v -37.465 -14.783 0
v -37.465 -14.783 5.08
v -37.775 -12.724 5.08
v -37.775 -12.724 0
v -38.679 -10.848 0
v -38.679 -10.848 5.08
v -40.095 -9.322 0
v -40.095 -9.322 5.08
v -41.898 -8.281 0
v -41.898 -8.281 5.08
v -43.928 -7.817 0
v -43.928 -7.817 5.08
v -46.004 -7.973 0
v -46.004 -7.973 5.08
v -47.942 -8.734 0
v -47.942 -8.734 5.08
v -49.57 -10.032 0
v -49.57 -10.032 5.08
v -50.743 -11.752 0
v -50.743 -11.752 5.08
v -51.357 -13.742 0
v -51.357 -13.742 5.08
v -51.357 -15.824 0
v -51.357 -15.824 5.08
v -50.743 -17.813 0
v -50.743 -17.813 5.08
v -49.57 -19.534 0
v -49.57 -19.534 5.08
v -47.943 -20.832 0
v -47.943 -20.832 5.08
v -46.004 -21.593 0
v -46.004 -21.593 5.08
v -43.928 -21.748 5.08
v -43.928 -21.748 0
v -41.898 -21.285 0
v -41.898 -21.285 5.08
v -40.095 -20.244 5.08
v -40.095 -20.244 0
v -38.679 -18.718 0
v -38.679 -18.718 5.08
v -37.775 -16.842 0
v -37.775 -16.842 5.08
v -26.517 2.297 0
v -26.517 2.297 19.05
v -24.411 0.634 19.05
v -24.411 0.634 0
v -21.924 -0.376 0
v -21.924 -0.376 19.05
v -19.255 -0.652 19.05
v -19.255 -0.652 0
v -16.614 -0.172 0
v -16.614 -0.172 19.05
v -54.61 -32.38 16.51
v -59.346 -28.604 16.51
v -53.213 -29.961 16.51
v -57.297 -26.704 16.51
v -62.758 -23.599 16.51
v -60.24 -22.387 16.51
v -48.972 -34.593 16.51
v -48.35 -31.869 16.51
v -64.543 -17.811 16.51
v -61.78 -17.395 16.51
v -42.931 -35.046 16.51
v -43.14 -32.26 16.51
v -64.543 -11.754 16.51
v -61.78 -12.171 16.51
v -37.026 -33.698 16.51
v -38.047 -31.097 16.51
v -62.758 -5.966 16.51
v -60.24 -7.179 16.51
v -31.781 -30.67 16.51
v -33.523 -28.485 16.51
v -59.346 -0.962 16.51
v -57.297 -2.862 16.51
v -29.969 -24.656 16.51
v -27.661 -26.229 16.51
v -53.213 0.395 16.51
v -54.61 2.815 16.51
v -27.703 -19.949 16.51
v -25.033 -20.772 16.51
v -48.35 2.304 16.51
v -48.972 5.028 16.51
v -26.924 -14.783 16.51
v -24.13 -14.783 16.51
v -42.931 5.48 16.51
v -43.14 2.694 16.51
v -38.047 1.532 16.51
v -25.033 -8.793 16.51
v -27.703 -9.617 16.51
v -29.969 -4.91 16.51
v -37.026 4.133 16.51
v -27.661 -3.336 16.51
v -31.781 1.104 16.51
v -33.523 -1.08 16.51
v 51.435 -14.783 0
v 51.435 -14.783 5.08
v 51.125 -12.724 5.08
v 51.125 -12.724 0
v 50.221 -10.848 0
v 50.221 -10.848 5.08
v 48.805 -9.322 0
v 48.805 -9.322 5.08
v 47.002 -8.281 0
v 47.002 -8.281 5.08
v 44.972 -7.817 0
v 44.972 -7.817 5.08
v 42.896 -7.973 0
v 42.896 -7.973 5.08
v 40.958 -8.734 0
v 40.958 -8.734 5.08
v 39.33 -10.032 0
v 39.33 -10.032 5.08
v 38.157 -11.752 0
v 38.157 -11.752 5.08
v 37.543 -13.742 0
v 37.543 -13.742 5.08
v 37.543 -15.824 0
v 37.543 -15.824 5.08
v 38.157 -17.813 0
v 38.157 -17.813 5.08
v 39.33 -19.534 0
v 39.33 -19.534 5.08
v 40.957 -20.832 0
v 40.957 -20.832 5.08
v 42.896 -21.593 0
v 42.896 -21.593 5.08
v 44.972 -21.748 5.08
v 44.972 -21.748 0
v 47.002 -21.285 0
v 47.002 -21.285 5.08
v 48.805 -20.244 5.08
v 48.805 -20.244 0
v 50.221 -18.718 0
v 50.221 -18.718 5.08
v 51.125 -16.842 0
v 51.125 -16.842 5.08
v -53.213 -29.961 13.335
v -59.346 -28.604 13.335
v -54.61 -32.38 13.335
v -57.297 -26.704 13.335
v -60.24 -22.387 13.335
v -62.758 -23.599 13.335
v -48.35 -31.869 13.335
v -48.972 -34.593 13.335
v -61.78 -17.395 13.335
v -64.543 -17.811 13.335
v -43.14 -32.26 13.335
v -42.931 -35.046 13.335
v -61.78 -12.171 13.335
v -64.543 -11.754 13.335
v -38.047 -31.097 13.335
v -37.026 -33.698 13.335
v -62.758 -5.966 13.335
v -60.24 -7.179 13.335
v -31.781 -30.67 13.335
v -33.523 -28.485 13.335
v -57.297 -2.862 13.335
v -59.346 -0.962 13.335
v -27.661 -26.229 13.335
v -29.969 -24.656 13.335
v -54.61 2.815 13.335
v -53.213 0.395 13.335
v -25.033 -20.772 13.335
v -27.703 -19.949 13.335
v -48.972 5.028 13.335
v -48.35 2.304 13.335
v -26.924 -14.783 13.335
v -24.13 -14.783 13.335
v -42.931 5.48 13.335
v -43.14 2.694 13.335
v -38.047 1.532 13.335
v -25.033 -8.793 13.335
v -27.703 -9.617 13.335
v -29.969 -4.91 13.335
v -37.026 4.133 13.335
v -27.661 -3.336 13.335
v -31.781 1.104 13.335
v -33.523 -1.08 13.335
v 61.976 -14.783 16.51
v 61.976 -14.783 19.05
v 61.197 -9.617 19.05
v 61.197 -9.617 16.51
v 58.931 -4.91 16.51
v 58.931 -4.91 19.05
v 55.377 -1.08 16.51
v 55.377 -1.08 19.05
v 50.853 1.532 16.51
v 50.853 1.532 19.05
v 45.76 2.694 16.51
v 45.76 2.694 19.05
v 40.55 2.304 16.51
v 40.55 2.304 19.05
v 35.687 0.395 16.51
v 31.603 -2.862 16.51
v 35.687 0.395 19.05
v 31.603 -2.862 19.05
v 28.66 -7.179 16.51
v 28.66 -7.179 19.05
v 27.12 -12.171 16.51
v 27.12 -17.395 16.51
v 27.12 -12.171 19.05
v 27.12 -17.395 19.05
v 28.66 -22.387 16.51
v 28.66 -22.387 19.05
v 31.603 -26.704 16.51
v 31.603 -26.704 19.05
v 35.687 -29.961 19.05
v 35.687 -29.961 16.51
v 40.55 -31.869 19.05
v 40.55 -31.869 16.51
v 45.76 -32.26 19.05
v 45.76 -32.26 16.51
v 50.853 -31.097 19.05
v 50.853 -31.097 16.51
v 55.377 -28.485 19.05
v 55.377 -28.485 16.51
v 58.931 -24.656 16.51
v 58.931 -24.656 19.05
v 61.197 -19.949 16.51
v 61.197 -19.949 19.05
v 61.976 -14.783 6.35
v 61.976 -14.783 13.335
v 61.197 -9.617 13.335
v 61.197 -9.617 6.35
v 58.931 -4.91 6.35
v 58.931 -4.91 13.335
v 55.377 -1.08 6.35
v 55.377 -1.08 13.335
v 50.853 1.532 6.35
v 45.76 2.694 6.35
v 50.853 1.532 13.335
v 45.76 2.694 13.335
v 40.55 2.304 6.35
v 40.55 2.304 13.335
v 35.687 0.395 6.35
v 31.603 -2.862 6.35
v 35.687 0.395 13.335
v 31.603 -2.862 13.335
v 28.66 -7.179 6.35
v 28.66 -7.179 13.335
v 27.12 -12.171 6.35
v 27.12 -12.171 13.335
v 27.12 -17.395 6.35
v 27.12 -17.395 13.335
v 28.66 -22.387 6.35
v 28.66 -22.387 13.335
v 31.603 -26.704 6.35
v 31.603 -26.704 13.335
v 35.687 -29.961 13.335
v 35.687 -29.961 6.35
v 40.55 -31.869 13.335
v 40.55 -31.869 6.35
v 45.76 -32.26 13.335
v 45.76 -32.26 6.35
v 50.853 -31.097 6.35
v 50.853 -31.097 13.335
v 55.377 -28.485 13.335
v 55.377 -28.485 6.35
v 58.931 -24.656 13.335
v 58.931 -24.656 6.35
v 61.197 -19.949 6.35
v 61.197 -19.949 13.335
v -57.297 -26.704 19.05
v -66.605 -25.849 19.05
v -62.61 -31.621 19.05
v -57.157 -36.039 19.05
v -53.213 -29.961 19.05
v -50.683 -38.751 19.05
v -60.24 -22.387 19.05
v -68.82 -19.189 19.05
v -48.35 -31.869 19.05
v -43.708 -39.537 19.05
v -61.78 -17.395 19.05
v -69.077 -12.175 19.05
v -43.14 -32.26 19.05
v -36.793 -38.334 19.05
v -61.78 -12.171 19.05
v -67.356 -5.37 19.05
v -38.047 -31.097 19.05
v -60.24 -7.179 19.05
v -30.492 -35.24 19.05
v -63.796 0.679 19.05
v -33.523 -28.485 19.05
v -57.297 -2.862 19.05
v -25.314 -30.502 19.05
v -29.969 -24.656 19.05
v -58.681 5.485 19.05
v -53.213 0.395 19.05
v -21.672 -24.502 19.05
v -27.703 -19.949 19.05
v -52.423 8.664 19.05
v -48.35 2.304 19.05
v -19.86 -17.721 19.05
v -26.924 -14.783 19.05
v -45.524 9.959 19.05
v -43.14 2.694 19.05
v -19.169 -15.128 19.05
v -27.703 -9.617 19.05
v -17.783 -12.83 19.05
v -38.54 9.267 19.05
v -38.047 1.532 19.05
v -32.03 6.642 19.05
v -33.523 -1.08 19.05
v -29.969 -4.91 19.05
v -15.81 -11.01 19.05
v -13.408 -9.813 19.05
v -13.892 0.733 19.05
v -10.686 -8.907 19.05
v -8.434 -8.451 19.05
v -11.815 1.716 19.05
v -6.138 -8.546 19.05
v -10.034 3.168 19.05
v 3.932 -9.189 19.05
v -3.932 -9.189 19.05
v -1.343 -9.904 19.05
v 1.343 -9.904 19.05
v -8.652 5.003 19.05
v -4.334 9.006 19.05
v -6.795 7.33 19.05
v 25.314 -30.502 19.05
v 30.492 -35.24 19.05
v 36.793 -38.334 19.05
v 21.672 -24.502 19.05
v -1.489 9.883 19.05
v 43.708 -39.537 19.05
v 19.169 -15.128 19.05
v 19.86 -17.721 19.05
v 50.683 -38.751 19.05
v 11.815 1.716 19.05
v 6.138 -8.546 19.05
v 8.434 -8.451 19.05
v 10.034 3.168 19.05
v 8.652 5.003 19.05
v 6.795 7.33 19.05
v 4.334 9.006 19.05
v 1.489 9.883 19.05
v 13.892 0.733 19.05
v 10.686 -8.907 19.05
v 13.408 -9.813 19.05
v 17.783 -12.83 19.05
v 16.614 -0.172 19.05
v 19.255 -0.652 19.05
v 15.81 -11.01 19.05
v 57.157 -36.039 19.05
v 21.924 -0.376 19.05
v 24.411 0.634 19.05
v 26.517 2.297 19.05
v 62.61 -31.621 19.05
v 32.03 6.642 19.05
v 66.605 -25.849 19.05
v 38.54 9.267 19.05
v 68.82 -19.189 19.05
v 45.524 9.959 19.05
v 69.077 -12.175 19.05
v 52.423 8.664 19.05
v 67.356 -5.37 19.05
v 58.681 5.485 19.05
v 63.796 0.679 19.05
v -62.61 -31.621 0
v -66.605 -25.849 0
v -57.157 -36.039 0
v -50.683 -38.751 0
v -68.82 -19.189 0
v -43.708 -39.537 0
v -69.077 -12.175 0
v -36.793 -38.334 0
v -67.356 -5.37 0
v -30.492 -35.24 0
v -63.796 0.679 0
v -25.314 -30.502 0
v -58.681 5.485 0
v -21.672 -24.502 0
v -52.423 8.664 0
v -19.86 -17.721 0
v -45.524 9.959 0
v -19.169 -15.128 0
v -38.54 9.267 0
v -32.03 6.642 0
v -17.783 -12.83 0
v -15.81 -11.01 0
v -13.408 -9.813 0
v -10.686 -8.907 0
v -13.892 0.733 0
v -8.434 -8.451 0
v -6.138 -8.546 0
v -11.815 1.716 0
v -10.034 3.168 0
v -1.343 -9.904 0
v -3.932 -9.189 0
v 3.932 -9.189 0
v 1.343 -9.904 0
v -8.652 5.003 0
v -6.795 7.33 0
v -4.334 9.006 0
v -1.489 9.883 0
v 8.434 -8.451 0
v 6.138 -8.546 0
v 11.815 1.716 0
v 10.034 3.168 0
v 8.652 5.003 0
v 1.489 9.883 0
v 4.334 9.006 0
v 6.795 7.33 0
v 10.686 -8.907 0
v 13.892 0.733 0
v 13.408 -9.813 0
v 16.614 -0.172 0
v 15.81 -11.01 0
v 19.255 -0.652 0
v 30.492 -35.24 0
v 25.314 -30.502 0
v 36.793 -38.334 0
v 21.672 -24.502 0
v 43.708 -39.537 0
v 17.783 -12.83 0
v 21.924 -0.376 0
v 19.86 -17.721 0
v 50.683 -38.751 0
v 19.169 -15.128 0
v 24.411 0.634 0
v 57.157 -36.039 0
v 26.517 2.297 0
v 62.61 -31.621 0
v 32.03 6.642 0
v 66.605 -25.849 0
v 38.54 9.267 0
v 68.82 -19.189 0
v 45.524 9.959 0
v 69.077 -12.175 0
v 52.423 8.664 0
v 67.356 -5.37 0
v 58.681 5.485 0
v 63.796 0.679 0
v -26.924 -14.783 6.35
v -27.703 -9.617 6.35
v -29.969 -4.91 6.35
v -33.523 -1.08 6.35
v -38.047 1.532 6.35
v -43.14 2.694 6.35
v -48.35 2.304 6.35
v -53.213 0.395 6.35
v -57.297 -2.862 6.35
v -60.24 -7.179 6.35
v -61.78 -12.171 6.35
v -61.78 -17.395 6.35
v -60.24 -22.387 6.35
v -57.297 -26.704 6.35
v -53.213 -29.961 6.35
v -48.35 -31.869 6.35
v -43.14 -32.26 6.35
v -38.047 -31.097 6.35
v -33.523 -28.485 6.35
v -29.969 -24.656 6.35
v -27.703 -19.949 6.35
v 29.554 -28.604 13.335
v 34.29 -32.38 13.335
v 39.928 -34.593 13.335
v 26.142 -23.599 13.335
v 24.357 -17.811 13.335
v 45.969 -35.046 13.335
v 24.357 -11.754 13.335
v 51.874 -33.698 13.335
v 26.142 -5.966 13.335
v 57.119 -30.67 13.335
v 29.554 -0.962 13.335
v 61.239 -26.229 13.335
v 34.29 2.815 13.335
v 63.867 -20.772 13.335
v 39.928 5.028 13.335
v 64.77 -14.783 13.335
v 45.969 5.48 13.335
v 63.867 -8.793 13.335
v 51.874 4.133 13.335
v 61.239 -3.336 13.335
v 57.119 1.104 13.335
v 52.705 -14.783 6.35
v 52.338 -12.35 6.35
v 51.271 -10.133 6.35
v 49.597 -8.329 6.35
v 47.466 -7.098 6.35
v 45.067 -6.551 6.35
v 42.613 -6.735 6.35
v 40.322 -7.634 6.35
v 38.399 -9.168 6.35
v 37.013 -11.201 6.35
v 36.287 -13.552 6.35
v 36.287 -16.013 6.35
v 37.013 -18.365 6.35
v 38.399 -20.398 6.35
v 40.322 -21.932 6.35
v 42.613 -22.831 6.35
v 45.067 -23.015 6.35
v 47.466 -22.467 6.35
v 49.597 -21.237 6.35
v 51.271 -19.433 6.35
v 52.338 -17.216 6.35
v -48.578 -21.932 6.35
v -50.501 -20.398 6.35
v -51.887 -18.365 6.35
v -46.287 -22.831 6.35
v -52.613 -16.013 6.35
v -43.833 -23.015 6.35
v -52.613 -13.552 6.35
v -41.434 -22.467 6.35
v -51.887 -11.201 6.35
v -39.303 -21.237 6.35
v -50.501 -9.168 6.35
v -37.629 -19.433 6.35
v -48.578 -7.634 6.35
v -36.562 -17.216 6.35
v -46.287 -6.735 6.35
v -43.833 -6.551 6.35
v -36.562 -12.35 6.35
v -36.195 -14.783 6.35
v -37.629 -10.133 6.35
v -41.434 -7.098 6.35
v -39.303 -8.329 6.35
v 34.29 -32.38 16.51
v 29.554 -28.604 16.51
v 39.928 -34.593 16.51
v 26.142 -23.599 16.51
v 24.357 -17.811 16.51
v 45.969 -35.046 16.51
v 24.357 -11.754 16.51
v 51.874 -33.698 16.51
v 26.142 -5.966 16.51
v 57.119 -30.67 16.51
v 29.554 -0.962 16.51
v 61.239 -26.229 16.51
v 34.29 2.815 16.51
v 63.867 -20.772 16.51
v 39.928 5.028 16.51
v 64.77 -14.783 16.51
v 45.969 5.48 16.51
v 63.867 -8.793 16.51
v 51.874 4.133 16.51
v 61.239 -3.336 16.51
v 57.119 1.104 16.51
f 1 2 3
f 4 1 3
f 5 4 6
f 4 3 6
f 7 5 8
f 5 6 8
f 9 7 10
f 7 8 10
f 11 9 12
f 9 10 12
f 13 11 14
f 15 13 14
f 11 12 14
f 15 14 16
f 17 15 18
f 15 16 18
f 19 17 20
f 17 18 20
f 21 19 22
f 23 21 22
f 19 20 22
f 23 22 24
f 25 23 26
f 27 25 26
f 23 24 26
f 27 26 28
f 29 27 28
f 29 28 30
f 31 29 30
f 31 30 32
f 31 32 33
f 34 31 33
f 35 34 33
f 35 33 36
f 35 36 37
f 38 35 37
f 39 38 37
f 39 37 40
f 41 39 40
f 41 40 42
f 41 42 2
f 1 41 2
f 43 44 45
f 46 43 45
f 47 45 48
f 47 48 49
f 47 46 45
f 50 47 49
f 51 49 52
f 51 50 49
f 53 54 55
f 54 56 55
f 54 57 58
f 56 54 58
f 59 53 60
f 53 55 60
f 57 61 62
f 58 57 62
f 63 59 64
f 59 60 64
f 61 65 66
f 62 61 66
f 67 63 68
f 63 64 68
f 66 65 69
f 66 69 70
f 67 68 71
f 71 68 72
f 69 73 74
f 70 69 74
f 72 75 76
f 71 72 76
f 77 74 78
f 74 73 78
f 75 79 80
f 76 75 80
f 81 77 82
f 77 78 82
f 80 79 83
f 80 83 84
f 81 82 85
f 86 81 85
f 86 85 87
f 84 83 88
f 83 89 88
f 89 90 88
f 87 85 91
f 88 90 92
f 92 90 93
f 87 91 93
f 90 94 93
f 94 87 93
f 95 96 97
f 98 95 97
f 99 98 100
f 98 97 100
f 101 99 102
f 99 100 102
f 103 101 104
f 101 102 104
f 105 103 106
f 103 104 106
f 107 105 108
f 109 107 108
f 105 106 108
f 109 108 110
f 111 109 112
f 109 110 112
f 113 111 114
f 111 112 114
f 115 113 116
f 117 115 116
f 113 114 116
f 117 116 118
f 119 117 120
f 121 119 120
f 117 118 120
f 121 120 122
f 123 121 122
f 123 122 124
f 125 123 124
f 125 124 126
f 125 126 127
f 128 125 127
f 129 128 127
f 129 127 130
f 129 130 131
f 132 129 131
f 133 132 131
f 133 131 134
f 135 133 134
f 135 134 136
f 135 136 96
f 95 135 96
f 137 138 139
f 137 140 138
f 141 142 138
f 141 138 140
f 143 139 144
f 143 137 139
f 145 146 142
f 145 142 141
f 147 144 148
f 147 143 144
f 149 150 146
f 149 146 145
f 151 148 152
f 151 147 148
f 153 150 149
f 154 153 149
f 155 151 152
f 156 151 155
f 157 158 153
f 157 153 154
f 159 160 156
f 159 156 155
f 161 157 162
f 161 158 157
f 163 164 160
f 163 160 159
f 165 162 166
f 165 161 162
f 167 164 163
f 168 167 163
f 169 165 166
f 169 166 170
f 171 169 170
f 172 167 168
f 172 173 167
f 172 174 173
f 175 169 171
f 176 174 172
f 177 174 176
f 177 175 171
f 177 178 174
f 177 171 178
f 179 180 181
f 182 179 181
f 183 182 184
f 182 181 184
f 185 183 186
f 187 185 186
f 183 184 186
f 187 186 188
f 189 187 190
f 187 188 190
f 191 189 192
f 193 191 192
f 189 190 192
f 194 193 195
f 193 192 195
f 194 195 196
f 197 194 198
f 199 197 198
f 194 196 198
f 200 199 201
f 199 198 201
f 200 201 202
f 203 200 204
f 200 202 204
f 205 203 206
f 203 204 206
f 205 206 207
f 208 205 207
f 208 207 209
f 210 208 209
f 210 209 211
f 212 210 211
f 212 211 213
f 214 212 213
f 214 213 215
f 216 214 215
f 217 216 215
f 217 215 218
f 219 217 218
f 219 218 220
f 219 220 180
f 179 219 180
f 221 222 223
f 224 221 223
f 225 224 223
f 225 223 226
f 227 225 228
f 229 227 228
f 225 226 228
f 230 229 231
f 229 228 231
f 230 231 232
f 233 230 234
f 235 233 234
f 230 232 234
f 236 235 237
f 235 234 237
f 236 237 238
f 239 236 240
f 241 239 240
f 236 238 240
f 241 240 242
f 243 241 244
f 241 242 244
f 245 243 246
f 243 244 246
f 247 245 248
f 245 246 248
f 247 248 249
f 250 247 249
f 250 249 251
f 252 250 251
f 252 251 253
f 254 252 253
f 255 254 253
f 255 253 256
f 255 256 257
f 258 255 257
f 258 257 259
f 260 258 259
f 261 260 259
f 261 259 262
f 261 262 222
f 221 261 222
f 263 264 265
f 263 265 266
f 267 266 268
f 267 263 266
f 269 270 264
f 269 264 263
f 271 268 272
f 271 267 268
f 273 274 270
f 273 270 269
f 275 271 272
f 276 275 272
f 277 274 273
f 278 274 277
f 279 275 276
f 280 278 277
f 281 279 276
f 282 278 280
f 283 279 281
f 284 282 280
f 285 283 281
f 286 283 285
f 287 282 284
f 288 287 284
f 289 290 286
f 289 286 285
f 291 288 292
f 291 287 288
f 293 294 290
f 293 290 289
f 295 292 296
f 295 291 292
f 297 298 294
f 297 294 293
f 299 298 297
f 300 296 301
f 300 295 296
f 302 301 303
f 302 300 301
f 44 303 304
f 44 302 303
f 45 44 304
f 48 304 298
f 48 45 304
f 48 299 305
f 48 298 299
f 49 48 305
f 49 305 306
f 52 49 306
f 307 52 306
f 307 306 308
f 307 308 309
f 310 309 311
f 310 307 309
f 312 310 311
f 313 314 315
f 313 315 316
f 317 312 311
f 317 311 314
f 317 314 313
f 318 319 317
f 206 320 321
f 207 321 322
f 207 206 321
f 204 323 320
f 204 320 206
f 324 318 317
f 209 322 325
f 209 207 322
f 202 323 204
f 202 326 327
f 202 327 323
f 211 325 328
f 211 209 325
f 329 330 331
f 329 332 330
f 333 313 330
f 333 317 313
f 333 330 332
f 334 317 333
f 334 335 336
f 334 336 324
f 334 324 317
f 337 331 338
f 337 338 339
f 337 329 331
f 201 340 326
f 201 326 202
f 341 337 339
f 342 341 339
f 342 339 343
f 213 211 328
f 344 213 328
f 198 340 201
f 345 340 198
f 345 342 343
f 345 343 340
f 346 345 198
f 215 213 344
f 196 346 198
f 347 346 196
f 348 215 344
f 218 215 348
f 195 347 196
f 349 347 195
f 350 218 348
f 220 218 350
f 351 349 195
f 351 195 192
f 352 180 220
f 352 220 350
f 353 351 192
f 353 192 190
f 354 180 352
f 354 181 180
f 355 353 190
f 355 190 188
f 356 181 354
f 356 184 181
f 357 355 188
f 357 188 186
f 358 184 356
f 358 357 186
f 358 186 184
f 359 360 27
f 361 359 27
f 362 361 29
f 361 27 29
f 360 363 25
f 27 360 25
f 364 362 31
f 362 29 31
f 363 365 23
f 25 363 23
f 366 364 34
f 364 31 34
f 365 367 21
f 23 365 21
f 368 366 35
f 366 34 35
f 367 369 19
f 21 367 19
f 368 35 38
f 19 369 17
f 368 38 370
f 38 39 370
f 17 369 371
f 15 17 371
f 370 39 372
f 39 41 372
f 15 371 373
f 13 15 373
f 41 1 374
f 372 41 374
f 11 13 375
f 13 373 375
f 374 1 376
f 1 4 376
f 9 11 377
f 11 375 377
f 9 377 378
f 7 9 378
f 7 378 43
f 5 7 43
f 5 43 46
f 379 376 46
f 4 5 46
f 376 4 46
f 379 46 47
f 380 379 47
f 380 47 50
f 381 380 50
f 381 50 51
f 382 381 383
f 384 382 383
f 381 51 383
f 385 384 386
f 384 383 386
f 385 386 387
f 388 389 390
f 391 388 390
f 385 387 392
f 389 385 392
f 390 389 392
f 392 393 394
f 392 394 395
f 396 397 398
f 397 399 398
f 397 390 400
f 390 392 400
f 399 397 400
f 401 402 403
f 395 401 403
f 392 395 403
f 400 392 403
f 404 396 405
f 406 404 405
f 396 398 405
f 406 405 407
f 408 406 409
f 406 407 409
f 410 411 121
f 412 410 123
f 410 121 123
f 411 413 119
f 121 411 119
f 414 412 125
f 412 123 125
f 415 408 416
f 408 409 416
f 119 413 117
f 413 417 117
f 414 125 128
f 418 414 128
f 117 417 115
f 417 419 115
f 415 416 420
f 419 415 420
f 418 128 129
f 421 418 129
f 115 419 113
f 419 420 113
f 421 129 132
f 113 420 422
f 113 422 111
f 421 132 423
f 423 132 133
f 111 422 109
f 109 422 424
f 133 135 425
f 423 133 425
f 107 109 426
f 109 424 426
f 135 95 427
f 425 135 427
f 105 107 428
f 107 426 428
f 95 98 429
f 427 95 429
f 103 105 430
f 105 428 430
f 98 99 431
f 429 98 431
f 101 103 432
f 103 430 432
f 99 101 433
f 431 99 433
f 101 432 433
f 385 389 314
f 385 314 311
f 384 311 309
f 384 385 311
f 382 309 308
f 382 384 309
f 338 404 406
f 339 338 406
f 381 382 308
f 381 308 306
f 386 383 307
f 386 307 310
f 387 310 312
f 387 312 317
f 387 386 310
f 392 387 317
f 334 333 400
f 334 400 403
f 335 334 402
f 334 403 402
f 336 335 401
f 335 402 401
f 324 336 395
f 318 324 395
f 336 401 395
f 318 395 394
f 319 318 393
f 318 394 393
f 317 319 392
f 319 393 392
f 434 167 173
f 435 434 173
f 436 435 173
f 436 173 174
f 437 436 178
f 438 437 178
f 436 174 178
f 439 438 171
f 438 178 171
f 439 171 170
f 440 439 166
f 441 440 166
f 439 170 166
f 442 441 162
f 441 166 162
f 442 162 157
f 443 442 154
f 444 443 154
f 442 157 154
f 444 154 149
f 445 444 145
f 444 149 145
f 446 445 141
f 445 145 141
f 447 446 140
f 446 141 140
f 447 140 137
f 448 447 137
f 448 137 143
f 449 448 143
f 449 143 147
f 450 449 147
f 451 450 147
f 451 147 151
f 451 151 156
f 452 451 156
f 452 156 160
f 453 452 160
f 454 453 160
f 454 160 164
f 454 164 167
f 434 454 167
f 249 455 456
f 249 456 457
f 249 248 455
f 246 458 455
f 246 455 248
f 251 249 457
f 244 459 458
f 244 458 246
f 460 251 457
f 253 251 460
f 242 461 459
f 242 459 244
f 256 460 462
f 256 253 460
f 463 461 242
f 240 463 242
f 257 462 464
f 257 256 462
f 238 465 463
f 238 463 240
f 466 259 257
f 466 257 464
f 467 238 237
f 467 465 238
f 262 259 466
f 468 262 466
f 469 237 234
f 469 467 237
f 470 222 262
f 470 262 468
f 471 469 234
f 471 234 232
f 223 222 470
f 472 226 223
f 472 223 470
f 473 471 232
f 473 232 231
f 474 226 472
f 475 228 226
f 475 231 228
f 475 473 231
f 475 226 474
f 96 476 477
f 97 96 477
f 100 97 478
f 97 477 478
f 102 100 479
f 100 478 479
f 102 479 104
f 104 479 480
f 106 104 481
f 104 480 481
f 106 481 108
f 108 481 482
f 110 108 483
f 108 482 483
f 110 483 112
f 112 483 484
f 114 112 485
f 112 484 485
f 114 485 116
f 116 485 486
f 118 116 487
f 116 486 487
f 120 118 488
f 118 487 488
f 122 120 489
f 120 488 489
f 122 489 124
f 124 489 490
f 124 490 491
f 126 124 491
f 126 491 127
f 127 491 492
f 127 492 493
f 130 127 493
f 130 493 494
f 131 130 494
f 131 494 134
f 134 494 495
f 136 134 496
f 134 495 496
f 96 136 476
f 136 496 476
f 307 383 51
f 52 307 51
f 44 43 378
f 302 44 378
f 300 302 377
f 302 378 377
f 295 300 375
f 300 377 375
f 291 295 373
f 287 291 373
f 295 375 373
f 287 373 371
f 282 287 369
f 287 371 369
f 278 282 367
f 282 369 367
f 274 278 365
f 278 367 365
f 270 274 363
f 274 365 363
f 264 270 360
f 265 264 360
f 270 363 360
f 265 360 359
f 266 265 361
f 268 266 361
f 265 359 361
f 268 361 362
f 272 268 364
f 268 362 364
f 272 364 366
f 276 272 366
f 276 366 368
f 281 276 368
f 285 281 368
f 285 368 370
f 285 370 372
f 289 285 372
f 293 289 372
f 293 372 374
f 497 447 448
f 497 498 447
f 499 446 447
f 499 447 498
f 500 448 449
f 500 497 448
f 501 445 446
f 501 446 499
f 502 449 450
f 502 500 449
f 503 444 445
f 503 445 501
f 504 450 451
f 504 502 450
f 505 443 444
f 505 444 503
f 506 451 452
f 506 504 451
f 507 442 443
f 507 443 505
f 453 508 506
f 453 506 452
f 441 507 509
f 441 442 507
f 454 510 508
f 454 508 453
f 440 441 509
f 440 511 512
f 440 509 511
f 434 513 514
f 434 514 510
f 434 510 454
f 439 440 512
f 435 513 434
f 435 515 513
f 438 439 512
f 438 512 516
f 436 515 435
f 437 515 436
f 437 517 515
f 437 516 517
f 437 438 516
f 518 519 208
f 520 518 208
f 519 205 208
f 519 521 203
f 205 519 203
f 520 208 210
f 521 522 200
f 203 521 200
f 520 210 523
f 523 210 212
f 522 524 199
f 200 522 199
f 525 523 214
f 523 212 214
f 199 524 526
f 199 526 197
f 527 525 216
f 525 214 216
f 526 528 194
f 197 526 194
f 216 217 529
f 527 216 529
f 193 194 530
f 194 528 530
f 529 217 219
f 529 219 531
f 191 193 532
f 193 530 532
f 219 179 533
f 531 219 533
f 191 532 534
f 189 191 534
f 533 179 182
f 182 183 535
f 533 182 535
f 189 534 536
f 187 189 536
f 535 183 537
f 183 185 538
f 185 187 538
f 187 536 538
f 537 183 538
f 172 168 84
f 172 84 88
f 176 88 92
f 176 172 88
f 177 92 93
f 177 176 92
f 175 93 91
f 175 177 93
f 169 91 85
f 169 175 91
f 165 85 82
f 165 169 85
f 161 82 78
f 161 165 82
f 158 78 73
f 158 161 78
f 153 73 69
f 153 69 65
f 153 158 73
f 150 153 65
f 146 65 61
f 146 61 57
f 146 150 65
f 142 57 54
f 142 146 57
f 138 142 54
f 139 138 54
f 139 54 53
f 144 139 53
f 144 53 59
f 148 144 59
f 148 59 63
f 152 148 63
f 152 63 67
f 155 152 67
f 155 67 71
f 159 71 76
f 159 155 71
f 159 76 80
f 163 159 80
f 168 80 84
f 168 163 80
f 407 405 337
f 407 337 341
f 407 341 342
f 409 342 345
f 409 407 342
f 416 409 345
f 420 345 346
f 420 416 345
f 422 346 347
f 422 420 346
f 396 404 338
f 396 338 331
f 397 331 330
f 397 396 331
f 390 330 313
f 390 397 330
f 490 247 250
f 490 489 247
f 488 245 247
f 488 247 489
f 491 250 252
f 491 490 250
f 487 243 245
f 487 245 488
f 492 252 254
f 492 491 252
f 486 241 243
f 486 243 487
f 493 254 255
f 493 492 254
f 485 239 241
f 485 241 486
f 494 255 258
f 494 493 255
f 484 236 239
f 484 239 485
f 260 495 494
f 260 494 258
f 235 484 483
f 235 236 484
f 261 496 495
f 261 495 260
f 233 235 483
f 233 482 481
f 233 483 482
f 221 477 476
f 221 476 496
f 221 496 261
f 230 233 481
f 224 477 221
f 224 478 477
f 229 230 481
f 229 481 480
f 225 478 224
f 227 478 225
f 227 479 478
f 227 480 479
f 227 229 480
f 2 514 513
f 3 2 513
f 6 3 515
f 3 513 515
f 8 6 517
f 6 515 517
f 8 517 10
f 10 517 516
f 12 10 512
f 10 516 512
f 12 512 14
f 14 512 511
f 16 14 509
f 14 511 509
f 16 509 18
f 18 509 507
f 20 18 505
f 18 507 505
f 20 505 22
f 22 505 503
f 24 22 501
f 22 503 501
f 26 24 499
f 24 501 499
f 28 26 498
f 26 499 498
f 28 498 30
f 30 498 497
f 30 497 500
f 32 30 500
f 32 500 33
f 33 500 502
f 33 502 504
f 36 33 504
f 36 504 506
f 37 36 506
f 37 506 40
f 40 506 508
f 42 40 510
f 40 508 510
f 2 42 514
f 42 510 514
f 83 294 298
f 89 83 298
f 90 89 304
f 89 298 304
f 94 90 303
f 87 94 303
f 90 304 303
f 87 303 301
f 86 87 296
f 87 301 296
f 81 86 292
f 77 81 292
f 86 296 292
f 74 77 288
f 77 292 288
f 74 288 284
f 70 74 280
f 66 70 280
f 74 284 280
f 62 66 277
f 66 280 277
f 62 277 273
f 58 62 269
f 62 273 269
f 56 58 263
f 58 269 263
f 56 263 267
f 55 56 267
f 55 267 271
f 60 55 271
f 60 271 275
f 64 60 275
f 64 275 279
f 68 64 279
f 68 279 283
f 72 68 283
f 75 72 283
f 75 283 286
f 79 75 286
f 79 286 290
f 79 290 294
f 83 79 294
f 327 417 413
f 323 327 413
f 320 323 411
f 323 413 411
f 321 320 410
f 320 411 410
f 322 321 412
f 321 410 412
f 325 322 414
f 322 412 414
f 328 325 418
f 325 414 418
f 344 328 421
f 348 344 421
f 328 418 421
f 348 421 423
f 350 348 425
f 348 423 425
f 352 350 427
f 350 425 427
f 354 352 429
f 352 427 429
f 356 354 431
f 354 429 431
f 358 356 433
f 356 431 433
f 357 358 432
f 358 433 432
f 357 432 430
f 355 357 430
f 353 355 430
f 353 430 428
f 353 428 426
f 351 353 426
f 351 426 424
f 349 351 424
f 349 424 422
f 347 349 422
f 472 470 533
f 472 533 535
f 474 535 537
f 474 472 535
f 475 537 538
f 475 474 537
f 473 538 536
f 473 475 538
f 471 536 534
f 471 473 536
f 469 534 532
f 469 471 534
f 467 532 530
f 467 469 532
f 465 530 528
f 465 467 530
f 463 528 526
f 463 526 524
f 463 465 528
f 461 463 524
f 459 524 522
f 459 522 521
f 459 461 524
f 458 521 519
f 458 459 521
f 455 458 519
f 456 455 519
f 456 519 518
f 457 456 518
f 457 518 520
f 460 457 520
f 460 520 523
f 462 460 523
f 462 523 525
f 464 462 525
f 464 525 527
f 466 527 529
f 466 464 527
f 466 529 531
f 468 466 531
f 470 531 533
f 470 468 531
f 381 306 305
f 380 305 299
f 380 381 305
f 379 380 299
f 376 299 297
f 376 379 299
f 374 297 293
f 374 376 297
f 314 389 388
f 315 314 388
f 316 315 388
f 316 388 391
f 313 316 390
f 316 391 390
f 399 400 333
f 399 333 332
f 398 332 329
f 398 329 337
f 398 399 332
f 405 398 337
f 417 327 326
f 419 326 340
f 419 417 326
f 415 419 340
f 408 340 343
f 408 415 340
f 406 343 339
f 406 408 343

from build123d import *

# Parameters (mm, degrees)
PAD_DEPTH       = 19.05
SKETCH001_R     = 17.526
POCKET_DEPTH    = 12.7
SKETCH002_R     = 6.985
POCKET001_DEPTH = 6.351
CHAMFER_SIZE    = 1.27
SKETCH003_R     = 20.32
POCKET002_DEPTH = 3.175


with BuildPart() as part:
    # Sketch → Pad (new body)
    with BuildSketch(Plane.XY):
        with BuildLine():
            ThreePointArc((-26.517355, 2.297173), (-67.949508, -22.598065), (-19.859908, -17.720926))
            ThreePointArc((-13.408051, -9.812702), (-17.782581, -12.829737), (-19.859908, -17.720926))
            Line((-10.685782, -8.907353), (-13.408051, -9.812702))
            ThreePointArc((-3.932394, -9.188814), (-7.283282, -8.428887), (-10.685782, -8.907353))
            ThreePointArc((-3.932394, -9.188814), (0, -9.9949), (3.932394, -9.188814))
            ThreePointArc((10.685782, -8.907353), (7.283282, -8.428887), (3.932394, -9.188814))
            Line((10.685782, -8.907353), (13.408051, -9.812702))
            ThreePointArc((19.859908, -17.720926), (17.782581, -12.829737), (13.408051, -9.812702))
            ThreePointArc((19.859908, -17.720926), (67.949508, -22.598065), (26.517355, 2.297173))
            ThreePointArc((16.614313, -0.171878), (21.924443, -0.375685), (26.517355, 2.297173))
            Line((13.892044, 0.73347), (16.614313, -0.171878))
            ThreePointArc((8.652348, 5.003488), (10.880692, 2.388068), (13.892044, 0.73347))
            ThreePointArc((8.652348, 5.003488), (0, 9.9949), (-8.652348, 5.003488))
            ThreePointArc((-13.892044, 0.73347), (-10.880692, 2.388068), (-8.652348, 5.003488))
            Line((-13.892044, 0.73347), (-16.614313, -0.171878))
            ThreePointArc((-26.517355, 2.297173), (-21.924443, -0.375685), (-16.614313, -0.171878))
        make_face()
    extrude(amount=PAD_DEPTH)

    # Sketch001 (on Face18 of Pad) → Pocket (cut)
    with BuildSketch(Plane.XY.offset(19.05)):
        with Locations((-44.45, -14.7828)):
            Circle(SKETCH001_R)
        with Locations((44.45, -14.7828)):
            Circle(SKETCH001_R)
    extrude(amount=-POCKET_DEPTH, mode=Mode.SUBTRACT)

    # Sketch002 (on Face21 of Pocket) → Pocket001 (cut, through all)
    with BuildSketch(Plane.XY.offset(6.35)):
        with Locations((-44.45, -14.7828)):
            Circle(SKETCH002_R)
        with Locations((44.45, -14.7828)):
            Circle(SKETCH002_R)
    extrude(amount=-POCKET001_DEPTH, mode=Mode.SUBTRACT)

    # Chamfer
    chamfer_edges = [part.edges().sort_by_distance(p)[0] for p in [
        (-51.435, -14.7828, 6.35),
        (37.465, -14.7828, 6.35),
    ]]
    chamfer(chamfer_edges, length=CHAMFER_SIZE)

    # Sketch003 (on DatumPlane) → Pocket002 (cut)
    with BuildSketch(Plane.XY.offset(13.335)):
        with Locations((-44.45, -14.7828)):
            Circle(SKETCH003_R)
        with Locations((44.45, -14.7828)):
            Circle(SKETCH003_R)
    extrude(amount=POCKET002_DEPTH, mode=Mode.SUBTRACT)


solid = part.part
